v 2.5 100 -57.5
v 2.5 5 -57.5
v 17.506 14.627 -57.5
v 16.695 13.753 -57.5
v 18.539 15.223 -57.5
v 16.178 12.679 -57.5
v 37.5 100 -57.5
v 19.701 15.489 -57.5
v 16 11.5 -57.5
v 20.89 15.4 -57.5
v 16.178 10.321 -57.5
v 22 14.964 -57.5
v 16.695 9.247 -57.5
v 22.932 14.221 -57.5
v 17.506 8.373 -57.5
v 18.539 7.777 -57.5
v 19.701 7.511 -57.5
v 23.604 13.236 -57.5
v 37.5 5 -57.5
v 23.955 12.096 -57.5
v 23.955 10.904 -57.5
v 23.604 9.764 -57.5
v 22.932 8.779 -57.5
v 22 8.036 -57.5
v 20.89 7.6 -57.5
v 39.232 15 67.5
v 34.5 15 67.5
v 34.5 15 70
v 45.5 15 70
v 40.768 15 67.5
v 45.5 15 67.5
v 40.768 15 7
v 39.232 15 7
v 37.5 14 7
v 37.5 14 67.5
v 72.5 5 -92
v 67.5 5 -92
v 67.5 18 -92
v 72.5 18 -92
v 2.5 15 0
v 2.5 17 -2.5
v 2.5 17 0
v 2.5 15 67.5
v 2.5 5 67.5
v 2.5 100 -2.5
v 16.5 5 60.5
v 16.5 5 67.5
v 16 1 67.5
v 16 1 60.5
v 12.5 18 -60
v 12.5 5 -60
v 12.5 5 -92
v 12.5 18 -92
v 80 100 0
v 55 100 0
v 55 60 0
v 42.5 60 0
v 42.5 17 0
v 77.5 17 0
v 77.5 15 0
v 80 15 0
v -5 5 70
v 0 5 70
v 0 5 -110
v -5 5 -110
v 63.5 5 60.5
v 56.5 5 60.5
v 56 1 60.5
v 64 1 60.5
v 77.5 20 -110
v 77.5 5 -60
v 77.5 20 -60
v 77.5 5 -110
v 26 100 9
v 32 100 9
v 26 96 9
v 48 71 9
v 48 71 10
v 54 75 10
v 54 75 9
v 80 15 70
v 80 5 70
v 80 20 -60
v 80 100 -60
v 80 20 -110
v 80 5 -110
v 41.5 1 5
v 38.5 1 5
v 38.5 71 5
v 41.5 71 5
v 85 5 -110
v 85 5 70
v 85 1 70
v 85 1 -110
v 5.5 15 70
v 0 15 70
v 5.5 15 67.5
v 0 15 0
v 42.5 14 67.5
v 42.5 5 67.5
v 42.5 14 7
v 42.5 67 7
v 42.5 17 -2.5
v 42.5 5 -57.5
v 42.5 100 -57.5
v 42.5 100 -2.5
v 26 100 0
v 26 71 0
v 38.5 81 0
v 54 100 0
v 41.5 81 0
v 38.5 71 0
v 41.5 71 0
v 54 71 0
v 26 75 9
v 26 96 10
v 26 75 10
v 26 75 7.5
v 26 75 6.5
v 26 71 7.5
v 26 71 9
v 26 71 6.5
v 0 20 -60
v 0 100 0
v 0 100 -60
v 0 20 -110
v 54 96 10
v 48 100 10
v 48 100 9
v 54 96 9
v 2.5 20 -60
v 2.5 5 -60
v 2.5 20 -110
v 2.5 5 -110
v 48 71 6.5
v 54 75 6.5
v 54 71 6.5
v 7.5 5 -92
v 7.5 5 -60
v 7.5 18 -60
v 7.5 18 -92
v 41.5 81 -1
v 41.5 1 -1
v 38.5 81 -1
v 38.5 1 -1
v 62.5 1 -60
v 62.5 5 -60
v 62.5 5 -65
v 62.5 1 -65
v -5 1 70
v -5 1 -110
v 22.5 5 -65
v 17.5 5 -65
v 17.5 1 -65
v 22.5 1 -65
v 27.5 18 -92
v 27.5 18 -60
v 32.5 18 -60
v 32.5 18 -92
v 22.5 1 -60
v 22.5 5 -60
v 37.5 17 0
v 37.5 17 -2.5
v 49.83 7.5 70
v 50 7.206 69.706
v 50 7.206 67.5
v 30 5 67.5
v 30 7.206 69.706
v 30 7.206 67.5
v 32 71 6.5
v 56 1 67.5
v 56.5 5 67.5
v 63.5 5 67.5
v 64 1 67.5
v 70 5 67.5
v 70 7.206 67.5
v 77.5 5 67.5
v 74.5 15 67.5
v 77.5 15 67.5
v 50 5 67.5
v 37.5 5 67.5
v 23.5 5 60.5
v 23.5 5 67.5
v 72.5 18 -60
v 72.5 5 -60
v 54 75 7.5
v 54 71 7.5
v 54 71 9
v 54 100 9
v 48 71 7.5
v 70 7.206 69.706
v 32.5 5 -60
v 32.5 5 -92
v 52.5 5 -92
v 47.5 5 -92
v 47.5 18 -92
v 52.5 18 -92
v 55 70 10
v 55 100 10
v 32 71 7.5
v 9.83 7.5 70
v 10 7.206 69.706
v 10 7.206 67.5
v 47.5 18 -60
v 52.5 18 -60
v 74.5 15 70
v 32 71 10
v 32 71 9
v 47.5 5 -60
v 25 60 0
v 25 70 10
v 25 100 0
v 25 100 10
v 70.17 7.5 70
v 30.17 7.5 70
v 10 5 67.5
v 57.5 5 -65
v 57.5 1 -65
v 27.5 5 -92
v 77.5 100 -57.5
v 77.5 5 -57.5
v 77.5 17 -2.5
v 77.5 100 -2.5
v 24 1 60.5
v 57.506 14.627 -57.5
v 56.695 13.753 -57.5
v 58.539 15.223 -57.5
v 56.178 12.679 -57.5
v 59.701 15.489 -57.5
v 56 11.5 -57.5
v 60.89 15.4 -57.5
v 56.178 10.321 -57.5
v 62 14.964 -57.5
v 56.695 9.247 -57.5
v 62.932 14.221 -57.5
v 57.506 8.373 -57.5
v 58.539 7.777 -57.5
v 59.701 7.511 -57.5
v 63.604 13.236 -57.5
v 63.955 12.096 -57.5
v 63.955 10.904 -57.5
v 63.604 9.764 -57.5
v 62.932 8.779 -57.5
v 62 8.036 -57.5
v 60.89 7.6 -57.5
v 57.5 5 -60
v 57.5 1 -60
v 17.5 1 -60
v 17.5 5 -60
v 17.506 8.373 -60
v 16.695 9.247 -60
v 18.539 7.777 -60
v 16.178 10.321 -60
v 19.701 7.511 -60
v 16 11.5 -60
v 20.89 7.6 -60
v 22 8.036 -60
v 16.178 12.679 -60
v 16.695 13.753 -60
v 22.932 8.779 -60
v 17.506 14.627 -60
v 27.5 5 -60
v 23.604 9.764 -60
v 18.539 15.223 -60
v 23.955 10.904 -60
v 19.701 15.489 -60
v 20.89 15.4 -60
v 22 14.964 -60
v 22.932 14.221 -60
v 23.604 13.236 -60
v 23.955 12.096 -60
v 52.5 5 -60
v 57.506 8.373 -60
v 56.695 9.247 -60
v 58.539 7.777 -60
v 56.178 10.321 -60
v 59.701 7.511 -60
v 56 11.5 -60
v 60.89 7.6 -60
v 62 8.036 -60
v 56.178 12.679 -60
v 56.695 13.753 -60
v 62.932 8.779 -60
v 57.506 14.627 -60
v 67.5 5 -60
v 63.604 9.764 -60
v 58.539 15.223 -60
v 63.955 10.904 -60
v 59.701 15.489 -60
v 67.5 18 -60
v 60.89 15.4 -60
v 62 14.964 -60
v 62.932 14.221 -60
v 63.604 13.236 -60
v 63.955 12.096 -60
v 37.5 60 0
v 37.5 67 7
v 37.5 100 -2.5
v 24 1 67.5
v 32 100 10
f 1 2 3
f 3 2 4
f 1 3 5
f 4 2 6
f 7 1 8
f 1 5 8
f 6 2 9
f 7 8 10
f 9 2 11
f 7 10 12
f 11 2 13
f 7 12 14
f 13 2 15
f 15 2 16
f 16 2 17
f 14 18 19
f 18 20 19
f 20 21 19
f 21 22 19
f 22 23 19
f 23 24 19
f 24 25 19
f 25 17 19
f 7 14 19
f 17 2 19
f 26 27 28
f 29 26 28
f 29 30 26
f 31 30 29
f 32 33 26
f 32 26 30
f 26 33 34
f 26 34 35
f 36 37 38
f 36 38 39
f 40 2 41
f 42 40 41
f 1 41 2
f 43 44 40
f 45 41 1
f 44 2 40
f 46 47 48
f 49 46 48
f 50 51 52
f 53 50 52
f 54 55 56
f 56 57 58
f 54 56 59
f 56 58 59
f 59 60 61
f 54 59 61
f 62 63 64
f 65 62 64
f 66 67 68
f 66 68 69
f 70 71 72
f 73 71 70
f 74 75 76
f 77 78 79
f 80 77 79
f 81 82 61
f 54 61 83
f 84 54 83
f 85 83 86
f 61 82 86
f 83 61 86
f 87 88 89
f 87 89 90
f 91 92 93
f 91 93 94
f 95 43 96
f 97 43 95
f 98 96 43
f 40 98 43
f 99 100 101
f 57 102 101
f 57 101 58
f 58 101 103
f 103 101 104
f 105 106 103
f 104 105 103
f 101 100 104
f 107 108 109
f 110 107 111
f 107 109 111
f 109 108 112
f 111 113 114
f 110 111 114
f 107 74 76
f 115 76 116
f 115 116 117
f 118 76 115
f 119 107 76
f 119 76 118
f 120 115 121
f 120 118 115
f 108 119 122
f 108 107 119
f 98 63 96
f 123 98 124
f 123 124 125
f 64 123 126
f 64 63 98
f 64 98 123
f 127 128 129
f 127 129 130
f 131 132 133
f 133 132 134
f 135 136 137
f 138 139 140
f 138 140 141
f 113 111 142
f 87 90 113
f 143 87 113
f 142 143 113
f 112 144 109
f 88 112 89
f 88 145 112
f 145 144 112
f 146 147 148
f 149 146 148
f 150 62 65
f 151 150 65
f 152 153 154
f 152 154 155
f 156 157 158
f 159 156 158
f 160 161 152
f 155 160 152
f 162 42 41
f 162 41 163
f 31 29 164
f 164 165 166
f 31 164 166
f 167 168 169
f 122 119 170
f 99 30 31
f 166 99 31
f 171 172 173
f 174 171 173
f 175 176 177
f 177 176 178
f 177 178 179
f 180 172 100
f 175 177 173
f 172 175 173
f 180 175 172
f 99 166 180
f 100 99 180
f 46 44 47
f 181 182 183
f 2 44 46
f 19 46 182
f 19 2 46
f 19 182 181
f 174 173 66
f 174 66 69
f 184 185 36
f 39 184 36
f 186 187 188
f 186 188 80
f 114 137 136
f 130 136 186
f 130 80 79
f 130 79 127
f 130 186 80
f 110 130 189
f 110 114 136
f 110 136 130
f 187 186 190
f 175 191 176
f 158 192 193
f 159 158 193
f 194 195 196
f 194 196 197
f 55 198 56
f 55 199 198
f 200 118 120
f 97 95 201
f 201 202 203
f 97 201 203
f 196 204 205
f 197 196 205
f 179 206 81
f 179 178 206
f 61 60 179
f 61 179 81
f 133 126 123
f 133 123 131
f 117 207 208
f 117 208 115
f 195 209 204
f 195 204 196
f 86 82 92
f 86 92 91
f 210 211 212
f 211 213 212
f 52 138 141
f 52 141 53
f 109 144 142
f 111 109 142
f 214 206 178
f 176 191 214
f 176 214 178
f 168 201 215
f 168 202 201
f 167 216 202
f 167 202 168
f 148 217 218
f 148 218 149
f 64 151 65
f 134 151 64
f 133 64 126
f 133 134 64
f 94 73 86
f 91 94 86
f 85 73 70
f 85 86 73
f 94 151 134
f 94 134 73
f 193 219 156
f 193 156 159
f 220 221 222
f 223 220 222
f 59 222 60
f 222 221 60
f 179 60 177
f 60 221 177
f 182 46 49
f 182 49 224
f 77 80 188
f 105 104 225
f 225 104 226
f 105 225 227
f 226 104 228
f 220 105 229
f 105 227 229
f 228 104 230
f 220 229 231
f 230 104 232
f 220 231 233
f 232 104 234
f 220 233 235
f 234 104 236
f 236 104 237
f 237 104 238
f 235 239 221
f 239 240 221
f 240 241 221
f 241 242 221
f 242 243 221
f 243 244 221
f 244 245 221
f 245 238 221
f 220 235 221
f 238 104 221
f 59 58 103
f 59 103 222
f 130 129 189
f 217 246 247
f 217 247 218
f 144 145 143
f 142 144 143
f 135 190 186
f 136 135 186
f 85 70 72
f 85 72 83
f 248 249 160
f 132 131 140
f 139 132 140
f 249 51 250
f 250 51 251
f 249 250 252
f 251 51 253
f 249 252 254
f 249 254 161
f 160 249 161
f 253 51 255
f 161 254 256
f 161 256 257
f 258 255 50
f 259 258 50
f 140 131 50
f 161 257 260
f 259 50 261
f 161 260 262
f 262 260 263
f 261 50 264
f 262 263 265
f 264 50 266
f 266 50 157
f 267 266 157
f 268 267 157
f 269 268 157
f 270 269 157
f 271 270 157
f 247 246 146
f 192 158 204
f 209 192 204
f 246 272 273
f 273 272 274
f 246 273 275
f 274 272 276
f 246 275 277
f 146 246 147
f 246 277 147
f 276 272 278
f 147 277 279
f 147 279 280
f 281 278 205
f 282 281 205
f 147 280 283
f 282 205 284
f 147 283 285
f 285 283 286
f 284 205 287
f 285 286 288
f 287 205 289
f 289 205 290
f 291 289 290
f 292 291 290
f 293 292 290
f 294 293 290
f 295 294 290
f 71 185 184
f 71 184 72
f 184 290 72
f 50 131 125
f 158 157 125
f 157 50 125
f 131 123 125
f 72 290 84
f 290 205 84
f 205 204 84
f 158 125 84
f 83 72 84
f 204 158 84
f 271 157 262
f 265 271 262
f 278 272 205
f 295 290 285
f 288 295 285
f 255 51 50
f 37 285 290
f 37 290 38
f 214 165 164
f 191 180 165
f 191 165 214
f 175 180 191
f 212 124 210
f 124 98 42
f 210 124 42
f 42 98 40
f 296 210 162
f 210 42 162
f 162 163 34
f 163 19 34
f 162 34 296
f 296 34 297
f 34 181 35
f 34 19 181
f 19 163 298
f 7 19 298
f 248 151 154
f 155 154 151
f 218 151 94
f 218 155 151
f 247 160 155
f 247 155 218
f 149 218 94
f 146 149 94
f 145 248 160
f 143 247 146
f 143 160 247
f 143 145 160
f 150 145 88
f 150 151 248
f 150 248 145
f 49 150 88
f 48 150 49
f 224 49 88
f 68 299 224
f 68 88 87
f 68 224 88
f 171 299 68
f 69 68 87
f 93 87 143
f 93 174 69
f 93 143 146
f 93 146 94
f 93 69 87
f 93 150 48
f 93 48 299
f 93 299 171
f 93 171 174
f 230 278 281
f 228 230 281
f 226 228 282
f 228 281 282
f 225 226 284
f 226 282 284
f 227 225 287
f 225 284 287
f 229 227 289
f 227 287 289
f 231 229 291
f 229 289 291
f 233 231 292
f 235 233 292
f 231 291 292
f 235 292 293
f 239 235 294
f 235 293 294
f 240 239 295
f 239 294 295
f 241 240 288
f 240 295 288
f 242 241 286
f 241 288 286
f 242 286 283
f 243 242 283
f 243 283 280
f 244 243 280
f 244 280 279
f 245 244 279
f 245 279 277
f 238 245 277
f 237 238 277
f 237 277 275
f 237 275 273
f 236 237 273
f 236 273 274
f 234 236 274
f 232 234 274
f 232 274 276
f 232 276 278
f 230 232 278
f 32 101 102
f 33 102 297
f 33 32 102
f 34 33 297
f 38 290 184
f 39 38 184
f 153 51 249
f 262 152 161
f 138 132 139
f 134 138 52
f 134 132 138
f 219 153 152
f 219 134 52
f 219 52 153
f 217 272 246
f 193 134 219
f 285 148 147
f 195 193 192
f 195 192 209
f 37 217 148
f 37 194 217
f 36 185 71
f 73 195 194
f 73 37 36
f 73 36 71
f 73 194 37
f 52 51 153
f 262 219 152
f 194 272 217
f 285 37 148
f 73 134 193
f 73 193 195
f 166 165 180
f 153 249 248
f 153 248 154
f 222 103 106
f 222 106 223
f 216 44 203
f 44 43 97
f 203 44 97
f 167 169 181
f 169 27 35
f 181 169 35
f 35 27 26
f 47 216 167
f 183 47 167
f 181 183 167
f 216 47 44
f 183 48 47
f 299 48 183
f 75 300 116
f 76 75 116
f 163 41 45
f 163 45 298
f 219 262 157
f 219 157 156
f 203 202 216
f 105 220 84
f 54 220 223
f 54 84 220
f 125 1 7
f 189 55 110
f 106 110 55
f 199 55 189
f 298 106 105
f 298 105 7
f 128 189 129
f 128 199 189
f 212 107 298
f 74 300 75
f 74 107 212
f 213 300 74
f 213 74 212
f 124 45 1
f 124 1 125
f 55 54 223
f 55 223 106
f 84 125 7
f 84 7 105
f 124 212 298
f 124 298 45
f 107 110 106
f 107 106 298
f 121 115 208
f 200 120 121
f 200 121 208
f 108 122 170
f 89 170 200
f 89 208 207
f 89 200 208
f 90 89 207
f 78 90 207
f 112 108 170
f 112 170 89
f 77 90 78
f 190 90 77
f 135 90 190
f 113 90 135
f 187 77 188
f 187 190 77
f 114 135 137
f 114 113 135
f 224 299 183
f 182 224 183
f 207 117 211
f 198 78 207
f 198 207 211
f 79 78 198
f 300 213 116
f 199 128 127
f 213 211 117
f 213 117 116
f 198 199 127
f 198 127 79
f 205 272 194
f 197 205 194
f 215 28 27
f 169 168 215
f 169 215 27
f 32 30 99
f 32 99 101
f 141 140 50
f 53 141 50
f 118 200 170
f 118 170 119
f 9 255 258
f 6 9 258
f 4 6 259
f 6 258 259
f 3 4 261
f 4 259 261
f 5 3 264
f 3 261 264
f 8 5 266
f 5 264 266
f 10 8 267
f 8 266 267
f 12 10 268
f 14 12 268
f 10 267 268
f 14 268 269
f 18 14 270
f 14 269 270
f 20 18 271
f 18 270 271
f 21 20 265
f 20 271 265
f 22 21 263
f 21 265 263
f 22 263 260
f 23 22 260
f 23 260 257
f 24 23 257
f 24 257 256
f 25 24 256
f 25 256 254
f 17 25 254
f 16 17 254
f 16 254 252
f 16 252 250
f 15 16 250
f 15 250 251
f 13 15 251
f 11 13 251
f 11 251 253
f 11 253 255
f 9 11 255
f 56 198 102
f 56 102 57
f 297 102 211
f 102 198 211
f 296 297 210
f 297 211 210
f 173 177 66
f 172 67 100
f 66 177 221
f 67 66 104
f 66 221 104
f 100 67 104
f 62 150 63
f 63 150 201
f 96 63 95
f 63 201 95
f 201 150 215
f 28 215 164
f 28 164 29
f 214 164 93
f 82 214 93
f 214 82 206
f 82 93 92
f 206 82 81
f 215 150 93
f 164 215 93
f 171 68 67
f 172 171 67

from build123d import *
from OCP.BRepFilletAPI import BRepFilletAPI_MakeChamfer

# Parameters (mm, degrees)
SKETCH1_W                                   = 80
SKETCH1_H                                   = 60
BOSS_EXTRUDE1_DEPTH                         = 100
CUT_EXTRUDE1_START                          = 5
SKETCH2_W                                   = 35
SKETCH2_H                                   = 55
CUT_EXTRUDE1_DEPTH                          = 95
SKETCH3_W                                   = 80
SKETCH3_H                                   = 5
BOSS_EXTRUDE2_DEPTH                         = 70
BOSS_EXTRUDE3_DEPTH                         = 10
SKETCH5_W                                   = 20
SKETCH5_H                                   = 2.5
CUT_EXTRUDE2_DEPTH                          = 7.5
SKETCH6_W                                   = 35
SKETCH6_H                                   = 12
CUT_EXTRUDE4_DEPTH                          = 57.5
CUT_EXTRUDE6_REACH                          = 184.483
SKETCH7_R                                   = 4
SKETCH9_W                                   = 80
SKETCH9_H                                   = 50
BOSS_EXTRUDE4_DEPTH                         = 5
SKETCH13_W                                  = 8
SKETCH13_H                                  = 7
CUT_EXTRUDE8_BUTTON_HOLES_DEPTH             = 166.90660023
BOSS_EXTRUDE5_OLED_MOUNT_DEPTH              = 10
BOSS_EXTRUDE6_OLED_MOUNT_DEPTH              = 1
BOSS_EXTRUDE7_START                         = -2.5
BOSS_EXTRUDE7_OLED_MOUNT_DEPTH              = 1
BOSS_EXTRUDE8_OLED_MOUNT_DEPTH              = 1
BOSS_EXTRUDE13_OLED_MOUNT_SUPPORT_DEPTH     = 30
CUT_EXTRUDE9_OLED_CABLE_DEPTH               = 10
CUT_EXTRUDE9_OLED_CABLE_DEPTH_BACK          = 154.430766146
SKETCH18_W                                  = 3
SKETCH18_H                                  = 6
BOSS_EXTRUDE12_OLED_CABLE_GUIDE_REACH       = 162.39
SKETCH20_W                                  = 5
SKETCH20_H                                  = 5
CUT_EXTRUDE10_SOLENOID_WIRE_HOLE_DEPTH      = 166.90660023
SKETCH21_W                                  = 5
SKETCH21_H                                  = 32
BOSS_EXTRUDE9_SOLENOID_SIDE_SUPPORT_DEPTH   = 13
SKETCH27_W                                  = 2.5
SKETCH27_H                                  = 50
BOSS_EXTRUDE13_SOLENOID_SECTION_WALLS_DEPTH = 15
SKETCH29_W                                  = 180
SKETCH29_H                                  = 5
BOSS_EXTRUDE9_GUIDE_DEPTH                   = 5
BOSS_EXTRUDE10_START                        = -80
SKETCH29_3_W                                = 180
SKETCH29_3_H                                = 5
BOSS_EXTRUDE10_GUIDE_DEPTH                  = 5
SKETCH33_W                                  = 90
SKETCH33_H                                  = 180
CUT_EXTRUDE7_SLIM_BASE_DEPTH                = 1
BOSS_EXTRUDE5_REACH                         = 217.163
CHAMFER3_THUMB_SIZE                         = 2.5
CHAMFER5_THUMB_SIZE                         = 4.5
CHAMFER5_THUMB_SIZE2                        = 7.794228634
CHAMFER5_THUMB_PART_2_SIZE                  = 4.5
CHAMFER5_THUMB_PART_2_SIZE2                 = 7.794228634
CHAMFER5_THUMB_PART_3_SIZE                  = 4.5
CHAMFER5_THUMB_PART_3_SIZE2                 = 7.794228634
CHAMFER6_SIZE                               = 1
CHAMFER6_SIZE2                              = 1.732050808


with BuildPart() as part:
    # Sketch1 → Boss-Extrude1 (new body)
    with BuildSketch(Plane(origin=(0, 0, 0), x_dir=(1, 0, 0), z_dir=(0, 1, 0))):
        with Locations((40, 30)):
            Rectangle(SKETCH1_W, SKETCH1_H)
    extrude(amount=BOSS_EXTRUDE1_DEPTH)

    # Sketch2 → Cut-Extrude1 (cut)
    with BuildSketch(Plane(origin=(0, 0, 0), x_dir=(1, 0, 0), z_dir=(0, 1, 0)).offset(CUT_EXTRUDE1_START)):
        with Locations((20, 30)):
            Rectangle(SKETCH2_W, SKETCH2_H)
        with Locations((60, 30)):
            Rectangle(SKETCH2_W, SKETCH2_H)
    extrude(amount=CUT_EXTRUDE1_DEPTH, mode=Mode.SUBTRACT)

    # Sketch3 → Boss-Extrude2 (add)
    with BuildSketch(Plane.XY):
        with Locations((40, 2.5)):
            Rectangle(SKETCH3_W, SKETCH3_H)
    extrude(amount=BOSS_EXTRUDE2_DEPTH)

    # Sketch4 → Boss-Extrude3 (add)
    with BuildSketch(Plane(origin=(0, 5, 0), x_dir=(1, 0, 0), z_dir=(0, 1, 0))):
        Polygon((80, 0), (77.5, 0), (77.5, -67.5), (42.5, -67.5), (42.5, 0), (37.5, 0), (37.5, -67.5), (2.5, -67.5), (2.5, 0), (0, 0), (0, -70), (80, -70), align=None)
    extrude(amount=BOSS_EXTRUDE3_DEPTH)

    # Sketch5 → Cut-Extrude2 (cut)
    with BuildSketch(Plane(origin=(0, 15, 0), x_dir=(1, 0, 0), z_dir=(0, 1, 0))):
        with Locations((20, -68.75)):
            Rectangle(SKETCH5_W, SKETCH5_H)
        with Locations((60, -68.75)):
            Rectangle(SKETCH5_W, SKETCH5_H)
    extrude(amount=-CUT_EXTRUDE2_DEPTH, mode=Mode.SUBTRACT)

    # Sketch6 → Cut-Extrude4 (cut)
    with BuildSketch(Plane.XY):
        with Locations((20, 11)):
            Rectangle(SKETCH6_W, SKETCH6_H)
        with Locations((60, 11)):
            Rectangle(SKETCH6_W, SKETCH6_H)
    extrude(amount=-CUT_EXTRUDE4_DEPTH, mode=Mode.SUBTRACT)

    # Sketch7 → Cut-Extrude6 (cut, up to next)
    with BuildSketch(Plane(origin=(0, 0, -60), x_dir=(-1, 0, 0), z_dir=(0, 0, -1)), mode=Mode.PRIVATE) as cut_extrude6_sk1:
        with Locations((-20, 11.5)):
            Circle(SKETCH7_R)
    cut_extrude6_tool1 = extrude(cut_extrude6_sk1.sketch, amount=-CUT_EXTRUDE6_REACH, mode=Mode.PRIVATE) & part.part
    # Sketch7 → Cut-Extrude6 (cut, up to next)
    with BuildSketch(Plane(origin=(0, 0, -60), x_dir=(-1, 0, 0), z_dir=(0, 0, -1)), mode=Mode.PRIVATE) as cut_extrude6_sk2:
        with Locations((-60, 11.5)):
            Circle(SKETCH7_R)
    cut_extrude6_tool2 = extrude(cut_extrude6_sk2.sketch, amount=-CUT_EXTRUDE6_REACH, mode=Mode.PRIVATE) & part.part
    add(cut_extrude6_tool1.solids().sort_by_distance((20, 11.5, -60))[0], mode=Mode.SUBTRACT)
    add(cut_extrude6_tool2.solids().sort_by_distance((60, 11.5, -60))[0], mode=Mode.SUBTRACT)

    # Sketch9 → Boss-Extrude4 (add)
    with BuildSketch(Plane(origin=(0, 0, 0), x_dir=(1, 0, 0), z_dir=(0, 1, 0))):
        with Locations((40, 85)):
            Rectangle(SKETCH9_W, SKETCH9_H)
    extrude(amount=BOSS_EXTRUDE4_DEPTH)

    # Sketch13 → Cut-Extrude8 _Button Holes (cut, through all)
    with BuildSketch(Plane(origin=(0, 5, 0), x_dir=(1, 0, 0), z_dir=(0, 1, 0))):
        with Locations((20, -64)):
            Rectangle(SKETCH13_W, SKETCH13_H)
        with Locations((60, -64)):
            Rectangle(SKETCH13_W, SKETCH13_H)
    extrude(amount=-CUT_EXTRUDE8_BUTTON_HOLES_DEPTH, mode=Mode.SUBTRACT)

    # Sketch14 → Boss-Extrude5 _OLED Mount (add)
    with BuildSketch(Plane.XY):
        Polygon((25, 100), (26, 100), (26, 71), (54, 71), (54, 100), (55, 100), (55, 70), (54, 70), (26, 70), (25, 70), align=None)
    extrude(amount=BOSS_EXTRUDE5_OLED_MOUNT_DEPTH)

    # Sketch15 → Boss-Extrude6 _OLED Mount (add)
    with BuildSketch(Plane.XY.offset(10)):
        Polygon((26, 71), (32, 71), (26, 75), align=None)
        Polygon((54, 75), (54, 71), (48, 71), align=None)
    extrude(amount=-BOSS_EXTRUDE6_OLED_MOUNT_DEPTH)

    # Sketch15_2 → Boss-Extrude7 _OLED Mount (add)
    with BuildSketch(Plane.XY.offset(10).offset(BOSS_EXTRUDE7_START)):
        Polygon((26, 71), (32, 71), (26, 75), align=None)
        Polygon((54, 75), (54, 71), (48, 71), align=None)
    extrude(amount=-BOSS_EXTRUDE7_OLED_MOUNT_DEPTH)

    # Sketch17 → Boss-Extrude8 _OLED Mount (add)
    with BuildSketch(Plane.XY.offset(10)):
        Polygon((54, 96), (54, 100), (48, 100), align=None)
        Polygon((26, 100), (32, 100), (26, 96), align=None)
    extrude(amount=-BOSS_EXTRUDE8_OLED_MOUNT_DEPTH)

    # Sketch32 → Boss-Extrude13 OLED Mount Support (add)
    with BuildSketch(Plane.ZY.offset(-25)):
        Polygon((0, 70), (10, 70), (0, 60), align=None)
    extrude(amount=-BOSS_EXTRUDE13_OLED_MOUNT_SUPPORT_DEPTH)

    # Sketch18 → Cut-Extrude9 _OLED Cable (cut, two sides: drawn at the far end of the back side and taken through both)
    with BuildSketch(Plane(origin=(0, 71, 0), x_dir=(1, 0, 0), z_dir=(0, 1, 0)).offset(-CUT_EXTRUDE9_OLED_CABLE_DEPTH_BACK)):
        with Locations((40, -2)):
            Rectangle(SKETCH18_W, SKETCH18_H)
    extrude(amount=CUT_EXTRUDE9_OLED_CABLE_DEPTH + CUT_EXTRUDE9_OLED_CABLE_DEPTH_BACK, mode=Mode.SUBTRACT)

    # Boss-Extrude12 _OLED Cable Guide: up to this plane
    boss_extrude12_oled_cable_guide_end = Plane(origin=(55, 70, 10), z_dir=(0, -0.7071067811865477, 0.7071067811865474))
    # Sketch31 → Boss-Extrude12 _OLED Cable Guide (add, up to the surface)
    with BuildSketch(Plane(origin=(0, 15, 0), x_dir=(1, 0, 0), z_dir=(0, 1, 0)), mode=Mode.PRIVATE) as boss_extrude12_oled_cable_guide_sk1:
        Polygon((37.5, 0), (38.5, 0), (38.5, -5), (41.5, -5), (41.5, 0), (42.5, 0), (42.5, -7), (37.5, -7), align=None)
    boss_extrude12_oled_cable_guide_tool1 = split(extrude(boss_extrude12_oled_cable_guide_sk1.sketch, amount=BOSS_EXTRUDE12_OLED_CABLE_GUIDE_REACH, mode=Mode.PRIVATE), bisect_by=boss_extrude12_oled_cable_guide_end, keep=Keep.BOTH, mode=Mode.PRIVATE)
    add(boss_extrude12_oled_cable_guide_tool1.solids().sort_by_distance((38, 15, 0.086023))[0])

    # Sketch20 → Cut-Extrude10 _Solenoid Wire Hole (cut, through all)
    with BuildSketch(Plane(origin=(0, 5, 0), x_dir=(1, 0, 0), z_dir=(0, 1, 0))):
        with Locations((60, 62.5)):
            Rectangle(SKETCH20_W, SKETCH20_H)
        with Locations((20, 62.5)):
            Rectangle(SKETCH20_W, SKETCH20_H)
    extrude(amount=-CUT_EXTRUDE10_SOLENOID_WIRE_HOLE_DEPTH, mode=Mode.SUBTRACT)

    # Sketch21 → Boss-Extrude9 _Solenoid Side Support (add)
    with BuildSketch(Plane(origin=(0, 5, 0), x_dir=(1, 0, 0), z_dir=(0, 1, 0))):
        with Locations((70, 76)):
            Rectangle(SKETCH21_W, SKETCH21_H)
        with Locations((50, 76)):
            Rectangle(SKETCH21_W, SKETCH21_H)
        with Locations((30, 76)):
            Rectangle(SKETCH21_W, SKETCH21_H)
        with Locations((10, 76)):
            Rectangle(SKETCH21_W, SKETCH21_H)
    extrude(amount=BOSS_EXTRUDE9_SOLENOID_SIDE_SUPPORT_DEPTH)

    # Sketch27 → Boss-Extrude13 _Solenoid Section Walls (add)
    with BuildSketch(Plane(origin=(0, 5, 0), x_dir=(1, 0, 0), z_dir=(0, 1, 0))):
        with Locations((78.75, 85)):
            Rectangle(SKETCH27_W, SKETCH27_H)
        with Locations((1.25, 85)):
            Rectangle(SKETCH27_W, SKETCH27_H)
    extrude(amount=BOSS_EXTRUDE13_SOLENOID_SECTION_WALLS_DEPTH)

    # Sketch29 → Boss-Extrude9 _Guide (add)
    with BuildSketch(Plane(origin=(80, 0, 0), x_dir=(0, 0, -1), z_dir=(1, 0, 0))):
        with Locations((20, 2.5)):
            Rectangle(SKETCH29_W, SKETCH29_H)
    extrude(amount=BOSS_EXTRUDE9_GUIDE_DEPTH)

    # Sketch29_3 → Boss-Extrude10 _Guide (add)
    with BuildSketch(Plane(origin=(80, 0, 0), x_dir=(0, 0, -1), z_dir=(1, 0, 0)).offset(BOSS_EXTRUDE10_START)):
        with Locations((20, 2.5)):
            Rectangle(SKETCH29_3_W, SKETCH29_3_H)
    extrude(amount=-BOSS_EXTRUDE10_GUIDE_DEPTH)

    # Sketch33 → Cut-Extrude7 _Slim Base (cut)
    with BuildSketch(Plane.XZ):
        with Locations((40, -20)):
            Rectangle(SKETCH33_W, SKETCH33_H)
    extrude(amount=-CUT_EXTRUDE7_SLIM_BASE_DEPTH, mode=Mode.SUBTRACT)

    # Sketch34 → Boss-Extrude5 (add, up to next)
    with BuildSketch(Plane.XY.offset(60.5), mode=Mode.PRIVATE) as boss_extrude5_sk1:
        Polygon((16, 5), (16.5, 5), (16, 1), align=None)
    boss_extrude5_tool1 = extrude(boss_extrude5_sk1.sketch, amount=BOSS_EXTRUDE5_REACH, mode=Mode.PRIVATE) - part.part
    # Sketch34 → Boss-Extrude5 (add, up to next)
    with BuildSketch(Plane.XY.offset(60.5), mode=Mode.PRIVATE) as boss_extrude5_sk2:
        Polygon((24, 5), (24, 1), (23.5, 5), align=None)
    boss_extrude5_tool2 = extrude(boss_extrude5_sk2.sketch, amount=BOSS_EXTRUDE5_REACH, mode=Mode.PRIVATE) - part.part
    # Sketch34 → Boss-Extrude5 (add, up to next)
    with BuildSketch(Plane.XY.offset(60.5), mode=Mode.PRIVATE) as boss_extrude5_sk3:
        Polygon((56.5, 5), (56, 5), (56, 1), align=None)
    boss_extrude5_tool3 = extrude(boss_extrude5_sk3.sketch, amount=BOSS_EXTRUDE5_REACH, mode=Mode.PRIVATE) - part.part
    # Sketch34 → Boss-Extrude5 (add, up to next)
    with BuildSketch(Plane.XY.offset(60.5), mode=Mode.PRIVATE) as boss_extrude5_sk4:
        Polygon((64, 1), (64, 5), (63.5, 5), align=None)
    boss_extrude5_tool4 = extrude(boss_extrude5_sk4.sketch, amount=BOSS_EXTRUDE5_REACH, mode=Mode.PRIVATE) - part.part
    add(boss_extrude5_tool1.solids().sort_by_distance((16.166667, 3.666667, 60.5))[0])
    add(boss_extrude5_tool2.solids().sort_by_distance((23.833333, 3.666667, 60.5))[0])
    add(boss_extrude5_tool3.solids().sort_by_distance((56.166667, 3.666667, 60.5))[0])
    add(boss_extrude5_tool4.solids().sort_by_distance((63.833333, 3.666667, 60.5))[0])

    # Chamfer3 _Thumb
    chamfer3_thumb_edges = [part.edges().sort_by_distance(p)[0] for p in [
        (20, 7.5, 67.5),
        (60, 7.5, 67.5),
    ]]
    chamfer(chamfer3_thumb_edges, length=CHAMFER3_THUMB_SIZE - 0.0001)  # a hair under: the kernel refuses the full size

    # Chamfer5 _Thumb
    chamfer5_thumb_edges = [part.edges().sort_by_distance(p)[0] for p in [
        (70, 15, 68.75),
    ]]
    chamfer5_thumb_side = [part.faces().sort_by_distance(p)[0] for p in [
        (78.266129032, 15, 38.266129032),
    ]]
    chamfer(chamfer5_thumb_edges, length=CHAMFER5_THUMB_SIZE, length2=CHAMFER5_THUMB_SIZE2, reference=chamfer5_thumb_side[0])

    # Chamfer5 _Thumb part 2
    chamfer5_thumb_part_2_edges = [part.edges().sort_by_distance(p)[0] for p in [
        (50, 15, 68.75),
        (30, 15, 68.75),
    ]]
    chamfer5_thumb_part_2_side = [part.faces().sort_by_distance(p)[0] for p in [
        (40, 15, 41.718085106),
    ]]
    chamfer(chamfer5_thumb_part_2_edges, length=CHAMFER5_THUMB_PART_2_SIZE, length2=CHAMFER5_THUMB_PART_2_SIZE2, reference=chamfer5_thumb_part_2_side[0])

    # Chamfer5 _Thumb part 3
    chamfer5_thumb_part_3_edges = [part.edges().sort_by_distance(p)[0] for p in [
        (10, 15, 68.75),
    ]]
    chamfer5_thumb_part_3_side = [part.faces().sort_by_distance(p)[0] for p in [
        (1.733870968, 15, 38.266129032),
    ]]
    chamfer(chamfer5_thumb_part_3_edges, length=CHAMFER5_THUMB_PART_3_SIZE, length2=CHAMFER5_THUMB_PART_3_SIZE2, reference=chamfer5_thumb_part_3_side[0])

    # Chamfer6: one chamfer whose edges measure the first distance from different faces: ONE call of the kernel's chamfer builder (chamfer() names one face for all edges)
    chamfer6_edges_1 = [part.edges().sort_by_distance(p)[0] for p in [
        (37.5, 15, 37.25),
    ]]
    chamfer6_side_1 = [part.faces().sort_by_distance(p)[0] for p in [
        (37.5, 47.010473988, -21.180224367),
    ]]
    chamfer6_edges_2 = [part.edges().sort_by_distance(p)[0] for p in [
        (42.5, 15, 37.25),
    ]]
    chamfer6_side_2 = [part.faces().sort_by_distance(p)[0] for p in [
        (42.5, 47.010473988, -21.180224367),
    ]]
    chamfer6 = BRepFilletAPI_MakeChamfer(part.part.solid().wrapped)
    for e in chamfer6_edges_1:
        chamfer6.Add(CHAMFER6_SIZE, CHAMFER6_SIZE2, e.wrapped, chamfer6_side_1[0].wrapped)  # the first distance lies on this face
    for e in chamfer6_edges_2:
        chamfer6.Add(CHAMFER6_SIZE, CHAMFER6_SIZE2, e.wrapped, chamfer6_side_2[0].wrapped)  # the first distance lies on this face
    add(Compound.cast(chamfer6.Shape()), mode=Mode.REPLACE)


solid = part.part
